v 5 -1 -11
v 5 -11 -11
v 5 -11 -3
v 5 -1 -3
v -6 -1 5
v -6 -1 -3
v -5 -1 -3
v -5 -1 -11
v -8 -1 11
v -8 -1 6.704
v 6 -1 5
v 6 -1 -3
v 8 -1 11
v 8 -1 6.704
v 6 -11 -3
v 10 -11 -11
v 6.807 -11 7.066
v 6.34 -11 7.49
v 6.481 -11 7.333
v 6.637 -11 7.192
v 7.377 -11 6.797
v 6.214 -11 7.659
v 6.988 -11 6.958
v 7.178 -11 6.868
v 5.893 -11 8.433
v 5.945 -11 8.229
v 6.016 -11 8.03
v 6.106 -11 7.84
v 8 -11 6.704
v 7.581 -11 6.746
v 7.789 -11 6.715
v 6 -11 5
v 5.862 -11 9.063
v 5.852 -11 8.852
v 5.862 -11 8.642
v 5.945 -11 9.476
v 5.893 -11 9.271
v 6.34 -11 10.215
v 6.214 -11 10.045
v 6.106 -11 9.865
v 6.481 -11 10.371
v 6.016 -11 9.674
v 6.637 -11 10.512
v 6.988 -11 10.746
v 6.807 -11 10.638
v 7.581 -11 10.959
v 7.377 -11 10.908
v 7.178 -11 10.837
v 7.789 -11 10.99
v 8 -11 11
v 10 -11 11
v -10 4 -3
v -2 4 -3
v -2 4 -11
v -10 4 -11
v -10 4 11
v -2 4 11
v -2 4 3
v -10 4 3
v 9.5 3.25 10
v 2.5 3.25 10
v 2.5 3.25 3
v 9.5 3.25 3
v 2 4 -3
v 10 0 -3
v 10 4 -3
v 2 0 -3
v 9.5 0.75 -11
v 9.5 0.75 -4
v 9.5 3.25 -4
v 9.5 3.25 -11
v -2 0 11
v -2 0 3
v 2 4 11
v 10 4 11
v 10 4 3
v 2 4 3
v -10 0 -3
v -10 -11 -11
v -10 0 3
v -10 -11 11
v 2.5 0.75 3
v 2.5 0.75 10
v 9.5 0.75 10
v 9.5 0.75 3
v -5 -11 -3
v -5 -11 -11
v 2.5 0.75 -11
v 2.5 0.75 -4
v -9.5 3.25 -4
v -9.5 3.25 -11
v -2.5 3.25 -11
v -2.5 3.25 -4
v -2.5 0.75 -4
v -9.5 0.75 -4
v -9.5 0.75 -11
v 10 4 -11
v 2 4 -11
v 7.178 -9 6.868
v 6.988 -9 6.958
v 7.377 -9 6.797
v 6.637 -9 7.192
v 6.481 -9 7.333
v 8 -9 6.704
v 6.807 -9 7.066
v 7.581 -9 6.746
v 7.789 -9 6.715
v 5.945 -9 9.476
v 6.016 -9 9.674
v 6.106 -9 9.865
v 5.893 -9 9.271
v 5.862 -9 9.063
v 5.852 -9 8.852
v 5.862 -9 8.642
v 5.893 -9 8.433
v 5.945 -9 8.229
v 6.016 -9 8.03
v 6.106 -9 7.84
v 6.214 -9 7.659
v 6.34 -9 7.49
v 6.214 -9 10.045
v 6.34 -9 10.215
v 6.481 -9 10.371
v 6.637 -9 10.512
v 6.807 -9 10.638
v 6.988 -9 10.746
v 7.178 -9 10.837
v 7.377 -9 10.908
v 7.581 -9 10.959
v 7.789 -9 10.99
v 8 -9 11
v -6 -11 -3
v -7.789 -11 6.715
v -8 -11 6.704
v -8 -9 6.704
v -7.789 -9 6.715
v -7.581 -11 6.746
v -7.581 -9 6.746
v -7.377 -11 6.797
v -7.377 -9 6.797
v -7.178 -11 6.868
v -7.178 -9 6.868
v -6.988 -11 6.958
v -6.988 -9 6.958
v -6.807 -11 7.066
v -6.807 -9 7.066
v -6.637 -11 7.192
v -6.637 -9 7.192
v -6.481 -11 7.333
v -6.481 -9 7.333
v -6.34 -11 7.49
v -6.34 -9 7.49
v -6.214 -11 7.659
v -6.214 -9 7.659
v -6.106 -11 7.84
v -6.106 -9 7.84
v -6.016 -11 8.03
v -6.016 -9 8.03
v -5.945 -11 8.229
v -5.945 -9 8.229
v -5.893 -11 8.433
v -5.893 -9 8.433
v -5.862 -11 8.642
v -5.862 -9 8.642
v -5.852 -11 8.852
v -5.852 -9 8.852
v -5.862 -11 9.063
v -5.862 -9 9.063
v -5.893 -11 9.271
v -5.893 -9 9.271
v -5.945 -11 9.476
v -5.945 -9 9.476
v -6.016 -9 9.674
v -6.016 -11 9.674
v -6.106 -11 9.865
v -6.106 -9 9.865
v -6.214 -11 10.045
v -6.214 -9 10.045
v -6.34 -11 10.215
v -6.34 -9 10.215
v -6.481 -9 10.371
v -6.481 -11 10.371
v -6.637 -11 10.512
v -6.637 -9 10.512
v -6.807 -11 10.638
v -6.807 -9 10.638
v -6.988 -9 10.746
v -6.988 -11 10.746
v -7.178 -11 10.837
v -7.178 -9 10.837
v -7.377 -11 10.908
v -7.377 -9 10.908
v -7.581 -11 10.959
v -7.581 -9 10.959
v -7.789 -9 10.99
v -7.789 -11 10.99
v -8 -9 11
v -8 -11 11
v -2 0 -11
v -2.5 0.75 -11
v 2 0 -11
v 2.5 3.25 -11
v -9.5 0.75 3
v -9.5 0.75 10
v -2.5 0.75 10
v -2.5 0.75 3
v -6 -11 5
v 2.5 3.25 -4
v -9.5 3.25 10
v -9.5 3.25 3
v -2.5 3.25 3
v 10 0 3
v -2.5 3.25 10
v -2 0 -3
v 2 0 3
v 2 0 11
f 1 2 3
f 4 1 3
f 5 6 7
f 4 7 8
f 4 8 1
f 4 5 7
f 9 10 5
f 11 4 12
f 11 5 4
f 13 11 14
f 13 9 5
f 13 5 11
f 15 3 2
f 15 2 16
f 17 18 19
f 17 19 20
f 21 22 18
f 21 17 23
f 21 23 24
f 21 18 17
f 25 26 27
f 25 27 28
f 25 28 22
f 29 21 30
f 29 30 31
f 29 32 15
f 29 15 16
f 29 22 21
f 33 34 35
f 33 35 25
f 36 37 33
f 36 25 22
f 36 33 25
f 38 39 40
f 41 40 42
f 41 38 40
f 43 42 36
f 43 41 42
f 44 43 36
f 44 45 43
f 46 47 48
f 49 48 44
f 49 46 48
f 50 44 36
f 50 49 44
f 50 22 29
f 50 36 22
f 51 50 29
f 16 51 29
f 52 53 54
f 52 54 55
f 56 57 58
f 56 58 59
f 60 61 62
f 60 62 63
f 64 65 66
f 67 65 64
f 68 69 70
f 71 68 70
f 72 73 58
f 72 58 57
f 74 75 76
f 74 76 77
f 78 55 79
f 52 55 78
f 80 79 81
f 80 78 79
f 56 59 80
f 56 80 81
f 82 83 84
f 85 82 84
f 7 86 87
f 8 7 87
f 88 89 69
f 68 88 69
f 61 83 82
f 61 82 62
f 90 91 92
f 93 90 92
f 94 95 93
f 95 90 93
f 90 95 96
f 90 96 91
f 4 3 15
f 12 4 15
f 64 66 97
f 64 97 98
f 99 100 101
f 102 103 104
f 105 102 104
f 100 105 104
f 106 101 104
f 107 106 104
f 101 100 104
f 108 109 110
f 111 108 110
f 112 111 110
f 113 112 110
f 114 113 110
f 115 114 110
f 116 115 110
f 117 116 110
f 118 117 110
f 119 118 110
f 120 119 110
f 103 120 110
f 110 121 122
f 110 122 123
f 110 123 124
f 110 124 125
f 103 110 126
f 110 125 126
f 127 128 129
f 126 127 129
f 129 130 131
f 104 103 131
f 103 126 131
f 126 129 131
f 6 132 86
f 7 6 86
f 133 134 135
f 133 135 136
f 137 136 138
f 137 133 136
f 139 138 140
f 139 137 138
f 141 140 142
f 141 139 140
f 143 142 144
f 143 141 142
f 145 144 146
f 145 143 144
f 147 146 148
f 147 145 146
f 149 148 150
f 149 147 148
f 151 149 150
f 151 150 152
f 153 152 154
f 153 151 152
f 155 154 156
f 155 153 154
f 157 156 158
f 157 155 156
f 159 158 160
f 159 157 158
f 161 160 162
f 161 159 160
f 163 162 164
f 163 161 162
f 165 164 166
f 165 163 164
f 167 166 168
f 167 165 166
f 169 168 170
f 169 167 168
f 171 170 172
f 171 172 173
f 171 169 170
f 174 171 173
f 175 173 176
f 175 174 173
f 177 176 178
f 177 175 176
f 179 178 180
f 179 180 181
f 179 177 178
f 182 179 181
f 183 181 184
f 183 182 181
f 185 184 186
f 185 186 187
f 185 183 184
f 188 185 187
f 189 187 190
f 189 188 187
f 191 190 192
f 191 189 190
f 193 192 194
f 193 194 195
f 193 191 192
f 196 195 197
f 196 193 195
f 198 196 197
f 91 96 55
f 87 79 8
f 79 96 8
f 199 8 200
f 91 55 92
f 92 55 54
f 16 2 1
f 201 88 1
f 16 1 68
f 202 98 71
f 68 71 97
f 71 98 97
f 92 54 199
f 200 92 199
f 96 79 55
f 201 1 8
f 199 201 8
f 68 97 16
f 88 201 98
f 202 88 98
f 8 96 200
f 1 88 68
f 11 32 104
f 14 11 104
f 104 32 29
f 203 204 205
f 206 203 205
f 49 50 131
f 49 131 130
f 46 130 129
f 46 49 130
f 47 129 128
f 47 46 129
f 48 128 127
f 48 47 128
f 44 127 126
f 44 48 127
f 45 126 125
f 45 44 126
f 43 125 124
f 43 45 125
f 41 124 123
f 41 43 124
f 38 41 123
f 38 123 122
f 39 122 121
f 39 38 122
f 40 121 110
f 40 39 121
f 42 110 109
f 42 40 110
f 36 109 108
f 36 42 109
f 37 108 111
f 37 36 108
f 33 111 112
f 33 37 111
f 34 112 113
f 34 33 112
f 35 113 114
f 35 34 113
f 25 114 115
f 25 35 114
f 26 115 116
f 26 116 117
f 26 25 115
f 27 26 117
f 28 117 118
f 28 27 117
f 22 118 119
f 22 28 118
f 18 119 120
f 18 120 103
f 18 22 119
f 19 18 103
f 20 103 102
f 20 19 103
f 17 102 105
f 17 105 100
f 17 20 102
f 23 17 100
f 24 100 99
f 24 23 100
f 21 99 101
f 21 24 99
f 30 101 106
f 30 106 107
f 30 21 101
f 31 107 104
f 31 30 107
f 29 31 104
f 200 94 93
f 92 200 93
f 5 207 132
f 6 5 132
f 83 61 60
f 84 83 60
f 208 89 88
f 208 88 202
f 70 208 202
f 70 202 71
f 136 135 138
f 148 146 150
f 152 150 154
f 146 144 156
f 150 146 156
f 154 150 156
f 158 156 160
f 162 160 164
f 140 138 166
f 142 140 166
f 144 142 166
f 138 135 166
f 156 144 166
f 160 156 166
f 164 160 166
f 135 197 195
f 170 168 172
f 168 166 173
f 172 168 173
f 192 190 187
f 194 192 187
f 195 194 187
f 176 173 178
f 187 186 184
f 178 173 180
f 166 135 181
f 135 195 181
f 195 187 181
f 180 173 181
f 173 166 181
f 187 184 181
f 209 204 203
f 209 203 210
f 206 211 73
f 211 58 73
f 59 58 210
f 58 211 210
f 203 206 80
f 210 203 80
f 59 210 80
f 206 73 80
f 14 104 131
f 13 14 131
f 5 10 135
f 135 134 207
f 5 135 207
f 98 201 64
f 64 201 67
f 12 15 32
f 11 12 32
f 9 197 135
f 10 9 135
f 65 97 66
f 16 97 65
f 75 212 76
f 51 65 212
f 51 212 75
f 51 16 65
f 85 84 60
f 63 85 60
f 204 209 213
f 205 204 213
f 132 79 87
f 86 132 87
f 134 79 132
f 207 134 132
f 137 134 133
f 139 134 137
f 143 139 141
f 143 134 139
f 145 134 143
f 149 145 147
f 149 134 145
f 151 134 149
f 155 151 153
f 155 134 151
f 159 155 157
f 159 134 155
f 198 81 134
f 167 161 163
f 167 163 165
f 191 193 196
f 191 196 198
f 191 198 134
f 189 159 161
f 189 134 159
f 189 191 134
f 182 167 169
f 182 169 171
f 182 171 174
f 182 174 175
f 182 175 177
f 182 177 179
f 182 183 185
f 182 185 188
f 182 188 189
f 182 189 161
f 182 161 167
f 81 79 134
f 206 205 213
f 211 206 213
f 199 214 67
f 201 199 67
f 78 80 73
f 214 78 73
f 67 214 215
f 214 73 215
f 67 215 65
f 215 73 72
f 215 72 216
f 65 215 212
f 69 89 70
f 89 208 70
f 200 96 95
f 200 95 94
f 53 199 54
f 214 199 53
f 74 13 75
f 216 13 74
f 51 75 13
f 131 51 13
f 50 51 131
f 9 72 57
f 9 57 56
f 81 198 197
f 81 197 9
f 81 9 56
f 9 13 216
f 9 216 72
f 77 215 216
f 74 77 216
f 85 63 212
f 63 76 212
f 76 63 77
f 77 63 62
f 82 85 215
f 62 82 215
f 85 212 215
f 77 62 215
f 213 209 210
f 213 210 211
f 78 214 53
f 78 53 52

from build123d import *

# Parameters (mm, degrees)
F0_W      = 20
F0_H      = 22
F1_DEPTH  = 11
F3_DEPTH  = 10
F5_DEPTH  = 2
F6_W      = 8
F6_H      = 8
F7_DEPTH  = 4
F8_W      = 7
F8_H      = 2.5
F9_DEPTH  = 25
F11_W     = 8
F11_H     = 4
F12_DEPTH = 1
F10_W     = 8
F10_H     = 4
F13_DEPTH = 1


with BuildPart() as f1:
    # F0 (on Front) → F1 (new body)
    with BuildSketch(Plane.XZ):
        Rectangle(F0_W, F0_H)
    extrude(amount=F1_DEPTH)

    # F2 (on face) → F3 (cut)
    with BuildSketch(Plane.XZ.offset(11)):
        Polygon((8, 6.704264), (8, 11), (-8, 11), (-8, 6.704264), (-6, 5), (-6, -3), (-5, -3), (-5, -11), (5, -11), (5, -3), (6, -3), (6, 5), align=None)
    extrude(amount=-F3_DEPTH, mode=Mode.SUBTRACT)

    # F4 (on face) → F5 (join)
    with BuildSketch(Plane.XZ.offset(11)):
        with BuildLine():
            Line((-8, 11), (-8, 6.704264))
            ThreePointArc((-8, 6.704264), (-5.852132, 8.852132), (-8, 11))
        make_face()
        with BuildLine():
            ThreePointArc((8, 11), (5.852132, 8.852132), (8, 6.704264))
            Line((8, 6.704264), (8, 11))
        make_face()
    extrude(amount=-F5_DEPTH)

    # F6 (on face) → F7 (join)
    with BuildSketch(Plane(origin=(0, 0, 0), x_dir=(-1, 0, 0), z_dir=(0, 1, 0))):
        with Locations((-6, 7)):
            Rectangle(F6_W, F6_H)
        with Locations((6, 7)):
            Rectangle(F6_W, F6_H)
        with Locations((-6, -7)):
            Rectangle(F6_W, F6_H)
        with Locations((6, -7)):
            Rectangle(F6_W, F6_H)
    extrude(amount=F7_DEPTH)

    # F8 (on face) → F9 (cut)
    with BuildSketch(Plane.XY.offset(11)):
        with Locations((-6, 2)):
            Rectangle(F8_W, F8_H)
        with Locations((6, 2)):
            Rectangle(F8_W, F8_H)
    extrude(amount=-F9_DEPTH, mode=Mode.SUBTRACT)

    # F11 (on face) → F12 (join)
    with BuildSketch(Plane.XY.offset(-3)):
        with Locations((6, 2)):
            Rectangle(F11_W, F11_H)
        with Locations((-6, 2)):
            Rectangle(F11_W, F11_H)
    extrude(amount=-F12_DEPTH)

    # F10 (on face) → F13 (join)
    with BuildSketch(Plane.XY.offset(11)):
        with Locations((6, 2)):
            Rectangle(F10_W, F10_H)
        with Locations((-6, 2)):
            Rectangle(F10_W, F10_H)
    extrude(amount=-F13_DEPTH)


solid = f1.part
